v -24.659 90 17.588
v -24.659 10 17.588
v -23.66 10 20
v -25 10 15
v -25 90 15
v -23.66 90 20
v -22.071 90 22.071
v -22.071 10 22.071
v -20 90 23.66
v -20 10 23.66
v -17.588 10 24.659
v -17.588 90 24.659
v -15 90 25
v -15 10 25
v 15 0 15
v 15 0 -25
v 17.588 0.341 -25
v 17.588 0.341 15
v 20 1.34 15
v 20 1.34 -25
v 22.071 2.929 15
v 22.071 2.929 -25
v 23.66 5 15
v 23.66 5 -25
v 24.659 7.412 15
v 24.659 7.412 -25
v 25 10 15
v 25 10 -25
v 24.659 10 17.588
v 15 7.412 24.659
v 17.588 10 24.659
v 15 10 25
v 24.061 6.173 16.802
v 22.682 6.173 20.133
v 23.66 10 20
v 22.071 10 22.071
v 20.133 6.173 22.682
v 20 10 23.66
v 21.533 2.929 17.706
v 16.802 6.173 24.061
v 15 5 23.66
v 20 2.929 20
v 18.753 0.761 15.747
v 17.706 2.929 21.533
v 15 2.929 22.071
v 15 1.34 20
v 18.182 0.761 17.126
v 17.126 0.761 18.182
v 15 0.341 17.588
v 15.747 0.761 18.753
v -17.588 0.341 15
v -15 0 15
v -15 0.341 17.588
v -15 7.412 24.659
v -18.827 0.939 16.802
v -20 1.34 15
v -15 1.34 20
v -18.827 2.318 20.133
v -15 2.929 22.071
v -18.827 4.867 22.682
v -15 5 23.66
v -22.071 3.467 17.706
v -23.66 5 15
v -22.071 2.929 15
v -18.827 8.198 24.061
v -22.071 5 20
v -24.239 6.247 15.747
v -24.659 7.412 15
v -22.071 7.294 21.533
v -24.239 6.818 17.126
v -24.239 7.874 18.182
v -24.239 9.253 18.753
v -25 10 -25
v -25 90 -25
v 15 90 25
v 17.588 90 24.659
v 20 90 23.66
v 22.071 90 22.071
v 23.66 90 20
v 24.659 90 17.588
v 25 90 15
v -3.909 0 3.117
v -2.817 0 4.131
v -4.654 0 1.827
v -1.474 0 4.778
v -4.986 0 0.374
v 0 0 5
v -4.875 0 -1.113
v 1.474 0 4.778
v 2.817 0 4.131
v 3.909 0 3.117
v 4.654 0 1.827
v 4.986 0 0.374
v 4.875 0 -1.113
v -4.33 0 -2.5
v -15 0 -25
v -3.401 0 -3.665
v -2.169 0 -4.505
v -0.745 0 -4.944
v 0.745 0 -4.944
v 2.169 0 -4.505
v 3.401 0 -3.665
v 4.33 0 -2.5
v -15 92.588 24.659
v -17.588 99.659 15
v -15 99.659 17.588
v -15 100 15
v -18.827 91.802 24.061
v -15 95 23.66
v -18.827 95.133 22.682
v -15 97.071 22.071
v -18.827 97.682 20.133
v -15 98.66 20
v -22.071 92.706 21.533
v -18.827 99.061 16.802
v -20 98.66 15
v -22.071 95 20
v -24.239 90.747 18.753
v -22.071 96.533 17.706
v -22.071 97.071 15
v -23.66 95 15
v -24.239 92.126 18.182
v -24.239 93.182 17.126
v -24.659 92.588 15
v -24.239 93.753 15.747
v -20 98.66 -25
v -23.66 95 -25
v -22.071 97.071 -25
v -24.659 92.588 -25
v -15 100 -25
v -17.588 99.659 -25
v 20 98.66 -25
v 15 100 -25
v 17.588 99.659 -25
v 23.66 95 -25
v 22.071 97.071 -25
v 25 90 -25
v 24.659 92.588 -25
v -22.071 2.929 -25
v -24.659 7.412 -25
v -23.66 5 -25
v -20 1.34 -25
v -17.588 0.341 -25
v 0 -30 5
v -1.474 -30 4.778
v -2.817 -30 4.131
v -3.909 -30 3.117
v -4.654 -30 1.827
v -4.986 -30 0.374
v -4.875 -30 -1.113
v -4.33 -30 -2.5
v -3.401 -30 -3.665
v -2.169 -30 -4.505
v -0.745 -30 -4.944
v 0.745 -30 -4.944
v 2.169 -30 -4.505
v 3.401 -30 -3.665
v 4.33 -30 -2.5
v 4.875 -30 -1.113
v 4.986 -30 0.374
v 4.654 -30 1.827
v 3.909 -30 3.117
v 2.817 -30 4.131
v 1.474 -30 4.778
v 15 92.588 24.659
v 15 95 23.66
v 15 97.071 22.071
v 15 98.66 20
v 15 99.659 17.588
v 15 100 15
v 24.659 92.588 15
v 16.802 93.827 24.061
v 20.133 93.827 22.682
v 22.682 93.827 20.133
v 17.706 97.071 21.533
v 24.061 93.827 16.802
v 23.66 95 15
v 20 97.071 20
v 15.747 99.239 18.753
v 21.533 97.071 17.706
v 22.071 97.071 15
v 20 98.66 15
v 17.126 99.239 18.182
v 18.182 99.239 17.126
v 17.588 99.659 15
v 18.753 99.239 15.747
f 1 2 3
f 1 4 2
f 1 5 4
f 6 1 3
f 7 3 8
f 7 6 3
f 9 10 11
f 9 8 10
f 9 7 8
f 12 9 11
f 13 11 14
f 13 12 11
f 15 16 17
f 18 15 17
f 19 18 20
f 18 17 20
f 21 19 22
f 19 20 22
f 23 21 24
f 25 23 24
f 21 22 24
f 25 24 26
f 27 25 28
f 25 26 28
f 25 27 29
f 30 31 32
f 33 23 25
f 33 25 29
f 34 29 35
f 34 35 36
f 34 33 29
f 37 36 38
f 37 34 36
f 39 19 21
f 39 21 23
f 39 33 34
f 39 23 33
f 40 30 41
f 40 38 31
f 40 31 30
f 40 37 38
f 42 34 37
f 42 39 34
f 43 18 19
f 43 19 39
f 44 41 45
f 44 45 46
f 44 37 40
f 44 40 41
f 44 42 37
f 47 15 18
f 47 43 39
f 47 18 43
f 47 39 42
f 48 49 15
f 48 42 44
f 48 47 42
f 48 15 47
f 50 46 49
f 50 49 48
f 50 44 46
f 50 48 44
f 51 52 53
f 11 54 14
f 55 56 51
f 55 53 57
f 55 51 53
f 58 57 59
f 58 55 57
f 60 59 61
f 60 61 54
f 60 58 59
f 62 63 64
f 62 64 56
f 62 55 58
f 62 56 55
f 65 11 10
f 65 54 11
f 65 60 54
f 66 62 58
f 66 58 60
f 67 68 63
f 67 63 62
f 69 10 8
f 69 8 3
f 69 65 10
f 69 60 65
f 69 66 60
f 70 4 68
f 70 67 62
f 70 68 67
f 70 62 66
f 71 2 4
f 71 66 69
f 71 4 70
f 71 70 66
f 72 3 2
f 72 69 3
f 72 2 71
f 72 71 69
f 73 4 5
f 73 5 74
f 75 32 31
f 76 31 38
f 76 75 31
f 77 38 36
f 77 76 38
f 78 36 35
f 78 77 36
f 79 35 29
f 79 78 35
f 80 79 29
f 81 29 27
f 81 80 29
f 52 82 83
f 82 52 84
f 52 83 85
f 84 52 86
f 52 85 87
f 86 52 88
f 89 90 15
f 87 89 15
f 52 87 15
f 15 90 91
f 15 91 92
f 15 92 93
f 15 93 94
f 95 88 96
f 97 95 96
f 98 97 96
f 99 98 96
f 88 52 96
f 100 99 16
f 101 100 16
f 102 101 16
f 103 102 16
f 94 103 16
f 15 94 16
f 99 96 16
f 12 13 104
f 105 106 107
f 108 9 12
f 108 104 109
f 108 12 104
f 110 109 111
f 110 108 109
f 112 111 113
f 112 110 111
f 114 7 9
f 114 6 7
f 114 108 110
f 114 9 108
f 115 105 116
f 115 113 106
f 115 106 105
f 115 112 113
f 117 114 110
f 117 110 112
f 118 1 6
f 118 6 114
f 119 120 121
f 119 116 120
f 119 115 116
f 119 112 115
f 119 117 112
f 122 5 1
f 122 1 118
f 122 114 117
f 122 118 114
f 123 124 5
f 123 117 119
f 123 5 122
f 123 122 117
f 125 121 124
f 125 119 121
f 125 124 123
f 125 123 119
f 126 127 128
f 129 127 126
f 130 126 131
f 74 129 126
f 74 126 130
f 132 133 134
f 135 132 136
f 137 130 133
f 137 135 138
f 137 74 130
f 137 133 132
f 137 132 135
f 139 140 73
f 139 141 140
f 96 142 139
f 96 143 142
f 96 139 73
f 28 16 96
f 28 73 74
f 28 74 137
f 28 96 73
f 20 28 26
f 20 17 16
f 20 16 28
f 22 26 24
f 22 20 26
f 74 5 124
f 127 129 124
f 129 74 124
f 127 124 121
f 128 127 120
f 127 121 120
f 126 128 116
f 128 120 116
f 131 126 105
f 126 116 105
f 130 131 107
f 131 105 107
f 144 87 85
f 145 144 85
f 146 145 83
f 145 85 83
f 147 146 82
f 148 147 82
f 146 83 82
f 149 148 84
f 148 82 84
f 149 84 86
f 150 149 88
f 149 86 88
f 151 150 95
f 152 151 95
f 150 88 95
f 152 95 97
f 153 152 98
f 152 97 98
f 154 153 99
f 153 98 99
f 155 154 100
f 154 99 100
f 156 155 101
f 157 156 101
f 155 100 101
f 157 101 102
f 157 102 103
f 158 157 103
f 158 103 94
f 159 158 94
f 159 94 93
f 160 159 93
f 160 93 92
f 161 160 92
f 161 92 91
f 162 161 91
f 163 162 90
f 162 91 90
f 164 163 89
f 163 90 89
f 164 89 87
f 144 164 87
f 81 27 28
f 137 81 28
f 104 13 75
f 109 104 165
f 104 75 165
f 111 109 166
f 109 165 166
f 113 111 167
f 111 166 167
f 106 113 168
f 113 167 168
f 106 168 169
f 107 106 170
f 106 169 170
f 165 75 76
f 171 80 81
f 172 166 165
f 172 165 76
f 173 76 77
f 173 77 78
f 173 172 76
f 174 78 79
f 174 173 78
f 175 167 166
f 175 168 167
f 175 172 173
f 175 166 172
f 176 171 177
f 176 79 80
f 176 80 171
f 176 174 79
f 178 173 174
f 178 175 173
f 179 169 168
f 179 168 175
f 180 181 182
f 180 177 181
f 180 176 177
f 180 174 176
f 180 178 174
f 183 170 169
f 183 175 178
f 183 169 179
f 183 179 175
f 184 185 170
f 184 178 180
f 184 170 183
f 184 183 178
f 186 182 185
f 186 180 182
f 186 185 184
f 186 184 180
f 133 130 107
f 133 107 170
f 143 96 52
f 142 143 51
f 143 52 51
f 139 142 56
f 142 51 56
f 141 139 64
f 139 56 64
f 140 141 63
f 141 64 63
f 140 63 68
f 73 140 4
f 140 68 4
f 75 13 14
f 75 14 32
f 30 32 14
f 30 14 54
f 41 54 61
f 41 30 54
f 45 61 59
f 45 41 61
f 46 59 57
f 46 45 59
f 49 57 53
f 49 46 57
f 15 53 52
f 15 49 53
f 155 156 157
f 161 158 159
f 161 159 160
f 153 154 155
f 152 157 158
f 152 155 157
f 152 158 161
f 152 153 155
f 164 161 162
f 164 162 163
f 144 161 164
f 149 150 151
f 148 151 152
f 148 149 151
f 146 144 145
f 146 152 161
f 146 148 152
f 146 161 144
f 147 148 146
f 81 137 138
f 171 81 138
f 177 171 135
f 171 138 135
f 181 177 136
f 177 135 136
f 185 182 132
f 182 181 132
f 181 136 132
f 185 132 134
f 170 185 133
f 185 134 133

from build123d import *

# Parameters (mm, degrees)
SKETCH1_W           = 50
SKETCH1_H           = 50
BOSS_EXTRUDE1_DEPTH = 100
SKETCH2_R           = 5
BOSS_EXTRUDE2_DEPTH = 30
FILLET1_R           = 10
FILLET2_R           = 10


with BuildPart() as part:
    # Sketch1 → Boss-Extrude1 (new body)
    with BuildSketch(Plane(origin=(0, 0, 0), x_dir=(1, 0, 0), z_dir=(0, 1, 0))):
        Rectangle(SKETCH1_W, SKETCH1_H)
    extrude(amount=BOSS_EXTRUDE1_DEPTH)

    # Sketch2 → Boss-Extrude2 (add)
    with BuildSketch(Plane.XZ):
        with Locations(Location((0, 0, 0), (0, 0, 90))):
            Circle(SKETCH2_R)
    extrude(amount=BOSS_EXTRUDE2_DEPTH)

    # Fillet1
    fillet1_edges = [part.edges().sort_by_distance(p)[0] for p in [
        (0, 100, 25),
        (0, 0, 25),
        (25, 50, 25),
        (-25, 50, 25),
    ]]
    fillet(fillet1_edges, radius=FILLET1_R)

    # Fillet2
    # the kernel refuses this fillet: 10 mm, written as the material it takes off along each edge
    with BuildSketch(Plane(origin=(-15, 90, 15), x_dir=(0, 1, 0), z_dir=(-1, 0, 0))) as fillet2_piece_1_section:
        Polygon((0, 0), (FILLET2_R, 0), (FILLET2_R, -FILLET2_R), (0, -FILLET2_R), align=None)
    fillet2_piece_1 = extrude(amount=FILLET2_R, mode=Mode.PRIVATE)
    fillet2_piece_1 = fillet2_piece_1 - Plane(origin=(-15, 90, 15), x_dir=(0, -0.7071067811865475, -0.7071067811865475), z_dir=(-1, 0, 0)) * Sphere(FILLET2_R, mode=Mode.PRIVATE)
    add(fillet2_piece_1, mode=Mode.SUBTRACT)
    with BuildSketch(Plane(origin=(15, 90, 15), x_dir=(1, 0, 0), z_dir=(0, 1, 0))) as fillet2_piece_2_section:
        Polygon((0, 0), (FILLET2_R, 0), (FILLET2_R, -FILLET2_R), (0, -FILLET2_R), align=None)
    fillet2_piece_2 = extrude(amount=FILLET2_R, mode=Mode.PRIVATE)
    fillet2_piece_2 = fillet2_piece_2 - Plane(origin=(15, 90, 15), x_dir=(-0.7071067811865475, 0, -0.7071067811865475), z_dir=(0, 1, 0)) * Sphere(FILLET2_R, mode=Mode.PRIVATE)
    add(fillet2_piece_2, mode=Mode.SUBTRACT)
    with BuildSketch(Plane(origin=(-15, 10, 15), x_dir=(0, -1, 0), z_dir=(-1, 0, 0))) as fillet2_piece_3_section:
        Polygon((0, 0), (FILLET2_R, 0), (FILLET2_R, FILLET2_R), (0, FILLET2_R), align=None)
    fillet2_piece_3 = extrude(amount=FILLET2_R, mode=Mode.PRIVATE)
    fillet2_piece_3 = fillet2_piece_3 - Plane(origin=(-15, 10, 15), x_dir=(0, 0.7071067811865475, -0.7071067811865475), z_dir=(-1, 0, 0)) * Sphere(FILLET2_R, mode=Mode.PRIVATE)
    add(fillet2_piece_3, mode=Mode.SUBTRACT)
    with BuildSketch(Plane(origin=(15, 10, 15), x_dir=(1, 0, 0), z_dir=(0, -1, 0))) as fillet2_piece_4_section:
        Polygon((0, 0), (FILLET2_R, 0), (FILLET2_R, FILLET2_R), (0, FILLET2_R), align=None)
    fillet2_piece_4 = extrude(amount=FILLET2_R, mode=Mode.PRIVATE)
    fillet2_piece_4 = fillet2_piece_4 - Plane(origin=(15, 10, 15), x_dir=(-0.7071067811865475, 0, -0.7071067811865475), z_dir=(0, -1, 0)) * Sphere(FILLET2_R, mode=Mode.PRIVATE)
    add(fillet2_piece_4, mode=Mode.SUBTRACT)
    with BuildSketch(Plane(origin=(-25, 100, 15), x_dir=(0, -1, 0), z_dir=(0, 0, -1)), Plane(origin=(25, 0, -50), x_dir=(-1, 0, 0), z_dir=(0, 0, 1))) as fillet2_piece_5:
        with BuildLine():
            CenterArc((FILLET2_R, -FILLET2_R), FILLET2_R, 90, 90)
            Line((0, -FILLET2_R), (0, 0))
            Line((0, 0), (FILLET2_R, 0))
        make_face()
    extrude(amount=65, mode=Mode.SUBTRACT)
    with BuildSketch(Plane(origin=(25, 100, -50), x_dir=(-1, 0, 0), z_dir=(0, 0, 1)), Plane(origin=(-25, 0, 15), x_dir=(0, 1, 0), z_dir=(0, 0, -1))) as fillet2_piece_6:
        with BuildLine():
            CenterArc((FILLET2_R, FILLET2_R), FILLET2_R, 180, 90)
            Line((0, FILLET2_R), (0, 0))
            Line((0, 0), (FILLET2_R, 0))
        make_face()
    extrude(amount=65, mode=Mode.SUBTRACT)


solid = part.part
